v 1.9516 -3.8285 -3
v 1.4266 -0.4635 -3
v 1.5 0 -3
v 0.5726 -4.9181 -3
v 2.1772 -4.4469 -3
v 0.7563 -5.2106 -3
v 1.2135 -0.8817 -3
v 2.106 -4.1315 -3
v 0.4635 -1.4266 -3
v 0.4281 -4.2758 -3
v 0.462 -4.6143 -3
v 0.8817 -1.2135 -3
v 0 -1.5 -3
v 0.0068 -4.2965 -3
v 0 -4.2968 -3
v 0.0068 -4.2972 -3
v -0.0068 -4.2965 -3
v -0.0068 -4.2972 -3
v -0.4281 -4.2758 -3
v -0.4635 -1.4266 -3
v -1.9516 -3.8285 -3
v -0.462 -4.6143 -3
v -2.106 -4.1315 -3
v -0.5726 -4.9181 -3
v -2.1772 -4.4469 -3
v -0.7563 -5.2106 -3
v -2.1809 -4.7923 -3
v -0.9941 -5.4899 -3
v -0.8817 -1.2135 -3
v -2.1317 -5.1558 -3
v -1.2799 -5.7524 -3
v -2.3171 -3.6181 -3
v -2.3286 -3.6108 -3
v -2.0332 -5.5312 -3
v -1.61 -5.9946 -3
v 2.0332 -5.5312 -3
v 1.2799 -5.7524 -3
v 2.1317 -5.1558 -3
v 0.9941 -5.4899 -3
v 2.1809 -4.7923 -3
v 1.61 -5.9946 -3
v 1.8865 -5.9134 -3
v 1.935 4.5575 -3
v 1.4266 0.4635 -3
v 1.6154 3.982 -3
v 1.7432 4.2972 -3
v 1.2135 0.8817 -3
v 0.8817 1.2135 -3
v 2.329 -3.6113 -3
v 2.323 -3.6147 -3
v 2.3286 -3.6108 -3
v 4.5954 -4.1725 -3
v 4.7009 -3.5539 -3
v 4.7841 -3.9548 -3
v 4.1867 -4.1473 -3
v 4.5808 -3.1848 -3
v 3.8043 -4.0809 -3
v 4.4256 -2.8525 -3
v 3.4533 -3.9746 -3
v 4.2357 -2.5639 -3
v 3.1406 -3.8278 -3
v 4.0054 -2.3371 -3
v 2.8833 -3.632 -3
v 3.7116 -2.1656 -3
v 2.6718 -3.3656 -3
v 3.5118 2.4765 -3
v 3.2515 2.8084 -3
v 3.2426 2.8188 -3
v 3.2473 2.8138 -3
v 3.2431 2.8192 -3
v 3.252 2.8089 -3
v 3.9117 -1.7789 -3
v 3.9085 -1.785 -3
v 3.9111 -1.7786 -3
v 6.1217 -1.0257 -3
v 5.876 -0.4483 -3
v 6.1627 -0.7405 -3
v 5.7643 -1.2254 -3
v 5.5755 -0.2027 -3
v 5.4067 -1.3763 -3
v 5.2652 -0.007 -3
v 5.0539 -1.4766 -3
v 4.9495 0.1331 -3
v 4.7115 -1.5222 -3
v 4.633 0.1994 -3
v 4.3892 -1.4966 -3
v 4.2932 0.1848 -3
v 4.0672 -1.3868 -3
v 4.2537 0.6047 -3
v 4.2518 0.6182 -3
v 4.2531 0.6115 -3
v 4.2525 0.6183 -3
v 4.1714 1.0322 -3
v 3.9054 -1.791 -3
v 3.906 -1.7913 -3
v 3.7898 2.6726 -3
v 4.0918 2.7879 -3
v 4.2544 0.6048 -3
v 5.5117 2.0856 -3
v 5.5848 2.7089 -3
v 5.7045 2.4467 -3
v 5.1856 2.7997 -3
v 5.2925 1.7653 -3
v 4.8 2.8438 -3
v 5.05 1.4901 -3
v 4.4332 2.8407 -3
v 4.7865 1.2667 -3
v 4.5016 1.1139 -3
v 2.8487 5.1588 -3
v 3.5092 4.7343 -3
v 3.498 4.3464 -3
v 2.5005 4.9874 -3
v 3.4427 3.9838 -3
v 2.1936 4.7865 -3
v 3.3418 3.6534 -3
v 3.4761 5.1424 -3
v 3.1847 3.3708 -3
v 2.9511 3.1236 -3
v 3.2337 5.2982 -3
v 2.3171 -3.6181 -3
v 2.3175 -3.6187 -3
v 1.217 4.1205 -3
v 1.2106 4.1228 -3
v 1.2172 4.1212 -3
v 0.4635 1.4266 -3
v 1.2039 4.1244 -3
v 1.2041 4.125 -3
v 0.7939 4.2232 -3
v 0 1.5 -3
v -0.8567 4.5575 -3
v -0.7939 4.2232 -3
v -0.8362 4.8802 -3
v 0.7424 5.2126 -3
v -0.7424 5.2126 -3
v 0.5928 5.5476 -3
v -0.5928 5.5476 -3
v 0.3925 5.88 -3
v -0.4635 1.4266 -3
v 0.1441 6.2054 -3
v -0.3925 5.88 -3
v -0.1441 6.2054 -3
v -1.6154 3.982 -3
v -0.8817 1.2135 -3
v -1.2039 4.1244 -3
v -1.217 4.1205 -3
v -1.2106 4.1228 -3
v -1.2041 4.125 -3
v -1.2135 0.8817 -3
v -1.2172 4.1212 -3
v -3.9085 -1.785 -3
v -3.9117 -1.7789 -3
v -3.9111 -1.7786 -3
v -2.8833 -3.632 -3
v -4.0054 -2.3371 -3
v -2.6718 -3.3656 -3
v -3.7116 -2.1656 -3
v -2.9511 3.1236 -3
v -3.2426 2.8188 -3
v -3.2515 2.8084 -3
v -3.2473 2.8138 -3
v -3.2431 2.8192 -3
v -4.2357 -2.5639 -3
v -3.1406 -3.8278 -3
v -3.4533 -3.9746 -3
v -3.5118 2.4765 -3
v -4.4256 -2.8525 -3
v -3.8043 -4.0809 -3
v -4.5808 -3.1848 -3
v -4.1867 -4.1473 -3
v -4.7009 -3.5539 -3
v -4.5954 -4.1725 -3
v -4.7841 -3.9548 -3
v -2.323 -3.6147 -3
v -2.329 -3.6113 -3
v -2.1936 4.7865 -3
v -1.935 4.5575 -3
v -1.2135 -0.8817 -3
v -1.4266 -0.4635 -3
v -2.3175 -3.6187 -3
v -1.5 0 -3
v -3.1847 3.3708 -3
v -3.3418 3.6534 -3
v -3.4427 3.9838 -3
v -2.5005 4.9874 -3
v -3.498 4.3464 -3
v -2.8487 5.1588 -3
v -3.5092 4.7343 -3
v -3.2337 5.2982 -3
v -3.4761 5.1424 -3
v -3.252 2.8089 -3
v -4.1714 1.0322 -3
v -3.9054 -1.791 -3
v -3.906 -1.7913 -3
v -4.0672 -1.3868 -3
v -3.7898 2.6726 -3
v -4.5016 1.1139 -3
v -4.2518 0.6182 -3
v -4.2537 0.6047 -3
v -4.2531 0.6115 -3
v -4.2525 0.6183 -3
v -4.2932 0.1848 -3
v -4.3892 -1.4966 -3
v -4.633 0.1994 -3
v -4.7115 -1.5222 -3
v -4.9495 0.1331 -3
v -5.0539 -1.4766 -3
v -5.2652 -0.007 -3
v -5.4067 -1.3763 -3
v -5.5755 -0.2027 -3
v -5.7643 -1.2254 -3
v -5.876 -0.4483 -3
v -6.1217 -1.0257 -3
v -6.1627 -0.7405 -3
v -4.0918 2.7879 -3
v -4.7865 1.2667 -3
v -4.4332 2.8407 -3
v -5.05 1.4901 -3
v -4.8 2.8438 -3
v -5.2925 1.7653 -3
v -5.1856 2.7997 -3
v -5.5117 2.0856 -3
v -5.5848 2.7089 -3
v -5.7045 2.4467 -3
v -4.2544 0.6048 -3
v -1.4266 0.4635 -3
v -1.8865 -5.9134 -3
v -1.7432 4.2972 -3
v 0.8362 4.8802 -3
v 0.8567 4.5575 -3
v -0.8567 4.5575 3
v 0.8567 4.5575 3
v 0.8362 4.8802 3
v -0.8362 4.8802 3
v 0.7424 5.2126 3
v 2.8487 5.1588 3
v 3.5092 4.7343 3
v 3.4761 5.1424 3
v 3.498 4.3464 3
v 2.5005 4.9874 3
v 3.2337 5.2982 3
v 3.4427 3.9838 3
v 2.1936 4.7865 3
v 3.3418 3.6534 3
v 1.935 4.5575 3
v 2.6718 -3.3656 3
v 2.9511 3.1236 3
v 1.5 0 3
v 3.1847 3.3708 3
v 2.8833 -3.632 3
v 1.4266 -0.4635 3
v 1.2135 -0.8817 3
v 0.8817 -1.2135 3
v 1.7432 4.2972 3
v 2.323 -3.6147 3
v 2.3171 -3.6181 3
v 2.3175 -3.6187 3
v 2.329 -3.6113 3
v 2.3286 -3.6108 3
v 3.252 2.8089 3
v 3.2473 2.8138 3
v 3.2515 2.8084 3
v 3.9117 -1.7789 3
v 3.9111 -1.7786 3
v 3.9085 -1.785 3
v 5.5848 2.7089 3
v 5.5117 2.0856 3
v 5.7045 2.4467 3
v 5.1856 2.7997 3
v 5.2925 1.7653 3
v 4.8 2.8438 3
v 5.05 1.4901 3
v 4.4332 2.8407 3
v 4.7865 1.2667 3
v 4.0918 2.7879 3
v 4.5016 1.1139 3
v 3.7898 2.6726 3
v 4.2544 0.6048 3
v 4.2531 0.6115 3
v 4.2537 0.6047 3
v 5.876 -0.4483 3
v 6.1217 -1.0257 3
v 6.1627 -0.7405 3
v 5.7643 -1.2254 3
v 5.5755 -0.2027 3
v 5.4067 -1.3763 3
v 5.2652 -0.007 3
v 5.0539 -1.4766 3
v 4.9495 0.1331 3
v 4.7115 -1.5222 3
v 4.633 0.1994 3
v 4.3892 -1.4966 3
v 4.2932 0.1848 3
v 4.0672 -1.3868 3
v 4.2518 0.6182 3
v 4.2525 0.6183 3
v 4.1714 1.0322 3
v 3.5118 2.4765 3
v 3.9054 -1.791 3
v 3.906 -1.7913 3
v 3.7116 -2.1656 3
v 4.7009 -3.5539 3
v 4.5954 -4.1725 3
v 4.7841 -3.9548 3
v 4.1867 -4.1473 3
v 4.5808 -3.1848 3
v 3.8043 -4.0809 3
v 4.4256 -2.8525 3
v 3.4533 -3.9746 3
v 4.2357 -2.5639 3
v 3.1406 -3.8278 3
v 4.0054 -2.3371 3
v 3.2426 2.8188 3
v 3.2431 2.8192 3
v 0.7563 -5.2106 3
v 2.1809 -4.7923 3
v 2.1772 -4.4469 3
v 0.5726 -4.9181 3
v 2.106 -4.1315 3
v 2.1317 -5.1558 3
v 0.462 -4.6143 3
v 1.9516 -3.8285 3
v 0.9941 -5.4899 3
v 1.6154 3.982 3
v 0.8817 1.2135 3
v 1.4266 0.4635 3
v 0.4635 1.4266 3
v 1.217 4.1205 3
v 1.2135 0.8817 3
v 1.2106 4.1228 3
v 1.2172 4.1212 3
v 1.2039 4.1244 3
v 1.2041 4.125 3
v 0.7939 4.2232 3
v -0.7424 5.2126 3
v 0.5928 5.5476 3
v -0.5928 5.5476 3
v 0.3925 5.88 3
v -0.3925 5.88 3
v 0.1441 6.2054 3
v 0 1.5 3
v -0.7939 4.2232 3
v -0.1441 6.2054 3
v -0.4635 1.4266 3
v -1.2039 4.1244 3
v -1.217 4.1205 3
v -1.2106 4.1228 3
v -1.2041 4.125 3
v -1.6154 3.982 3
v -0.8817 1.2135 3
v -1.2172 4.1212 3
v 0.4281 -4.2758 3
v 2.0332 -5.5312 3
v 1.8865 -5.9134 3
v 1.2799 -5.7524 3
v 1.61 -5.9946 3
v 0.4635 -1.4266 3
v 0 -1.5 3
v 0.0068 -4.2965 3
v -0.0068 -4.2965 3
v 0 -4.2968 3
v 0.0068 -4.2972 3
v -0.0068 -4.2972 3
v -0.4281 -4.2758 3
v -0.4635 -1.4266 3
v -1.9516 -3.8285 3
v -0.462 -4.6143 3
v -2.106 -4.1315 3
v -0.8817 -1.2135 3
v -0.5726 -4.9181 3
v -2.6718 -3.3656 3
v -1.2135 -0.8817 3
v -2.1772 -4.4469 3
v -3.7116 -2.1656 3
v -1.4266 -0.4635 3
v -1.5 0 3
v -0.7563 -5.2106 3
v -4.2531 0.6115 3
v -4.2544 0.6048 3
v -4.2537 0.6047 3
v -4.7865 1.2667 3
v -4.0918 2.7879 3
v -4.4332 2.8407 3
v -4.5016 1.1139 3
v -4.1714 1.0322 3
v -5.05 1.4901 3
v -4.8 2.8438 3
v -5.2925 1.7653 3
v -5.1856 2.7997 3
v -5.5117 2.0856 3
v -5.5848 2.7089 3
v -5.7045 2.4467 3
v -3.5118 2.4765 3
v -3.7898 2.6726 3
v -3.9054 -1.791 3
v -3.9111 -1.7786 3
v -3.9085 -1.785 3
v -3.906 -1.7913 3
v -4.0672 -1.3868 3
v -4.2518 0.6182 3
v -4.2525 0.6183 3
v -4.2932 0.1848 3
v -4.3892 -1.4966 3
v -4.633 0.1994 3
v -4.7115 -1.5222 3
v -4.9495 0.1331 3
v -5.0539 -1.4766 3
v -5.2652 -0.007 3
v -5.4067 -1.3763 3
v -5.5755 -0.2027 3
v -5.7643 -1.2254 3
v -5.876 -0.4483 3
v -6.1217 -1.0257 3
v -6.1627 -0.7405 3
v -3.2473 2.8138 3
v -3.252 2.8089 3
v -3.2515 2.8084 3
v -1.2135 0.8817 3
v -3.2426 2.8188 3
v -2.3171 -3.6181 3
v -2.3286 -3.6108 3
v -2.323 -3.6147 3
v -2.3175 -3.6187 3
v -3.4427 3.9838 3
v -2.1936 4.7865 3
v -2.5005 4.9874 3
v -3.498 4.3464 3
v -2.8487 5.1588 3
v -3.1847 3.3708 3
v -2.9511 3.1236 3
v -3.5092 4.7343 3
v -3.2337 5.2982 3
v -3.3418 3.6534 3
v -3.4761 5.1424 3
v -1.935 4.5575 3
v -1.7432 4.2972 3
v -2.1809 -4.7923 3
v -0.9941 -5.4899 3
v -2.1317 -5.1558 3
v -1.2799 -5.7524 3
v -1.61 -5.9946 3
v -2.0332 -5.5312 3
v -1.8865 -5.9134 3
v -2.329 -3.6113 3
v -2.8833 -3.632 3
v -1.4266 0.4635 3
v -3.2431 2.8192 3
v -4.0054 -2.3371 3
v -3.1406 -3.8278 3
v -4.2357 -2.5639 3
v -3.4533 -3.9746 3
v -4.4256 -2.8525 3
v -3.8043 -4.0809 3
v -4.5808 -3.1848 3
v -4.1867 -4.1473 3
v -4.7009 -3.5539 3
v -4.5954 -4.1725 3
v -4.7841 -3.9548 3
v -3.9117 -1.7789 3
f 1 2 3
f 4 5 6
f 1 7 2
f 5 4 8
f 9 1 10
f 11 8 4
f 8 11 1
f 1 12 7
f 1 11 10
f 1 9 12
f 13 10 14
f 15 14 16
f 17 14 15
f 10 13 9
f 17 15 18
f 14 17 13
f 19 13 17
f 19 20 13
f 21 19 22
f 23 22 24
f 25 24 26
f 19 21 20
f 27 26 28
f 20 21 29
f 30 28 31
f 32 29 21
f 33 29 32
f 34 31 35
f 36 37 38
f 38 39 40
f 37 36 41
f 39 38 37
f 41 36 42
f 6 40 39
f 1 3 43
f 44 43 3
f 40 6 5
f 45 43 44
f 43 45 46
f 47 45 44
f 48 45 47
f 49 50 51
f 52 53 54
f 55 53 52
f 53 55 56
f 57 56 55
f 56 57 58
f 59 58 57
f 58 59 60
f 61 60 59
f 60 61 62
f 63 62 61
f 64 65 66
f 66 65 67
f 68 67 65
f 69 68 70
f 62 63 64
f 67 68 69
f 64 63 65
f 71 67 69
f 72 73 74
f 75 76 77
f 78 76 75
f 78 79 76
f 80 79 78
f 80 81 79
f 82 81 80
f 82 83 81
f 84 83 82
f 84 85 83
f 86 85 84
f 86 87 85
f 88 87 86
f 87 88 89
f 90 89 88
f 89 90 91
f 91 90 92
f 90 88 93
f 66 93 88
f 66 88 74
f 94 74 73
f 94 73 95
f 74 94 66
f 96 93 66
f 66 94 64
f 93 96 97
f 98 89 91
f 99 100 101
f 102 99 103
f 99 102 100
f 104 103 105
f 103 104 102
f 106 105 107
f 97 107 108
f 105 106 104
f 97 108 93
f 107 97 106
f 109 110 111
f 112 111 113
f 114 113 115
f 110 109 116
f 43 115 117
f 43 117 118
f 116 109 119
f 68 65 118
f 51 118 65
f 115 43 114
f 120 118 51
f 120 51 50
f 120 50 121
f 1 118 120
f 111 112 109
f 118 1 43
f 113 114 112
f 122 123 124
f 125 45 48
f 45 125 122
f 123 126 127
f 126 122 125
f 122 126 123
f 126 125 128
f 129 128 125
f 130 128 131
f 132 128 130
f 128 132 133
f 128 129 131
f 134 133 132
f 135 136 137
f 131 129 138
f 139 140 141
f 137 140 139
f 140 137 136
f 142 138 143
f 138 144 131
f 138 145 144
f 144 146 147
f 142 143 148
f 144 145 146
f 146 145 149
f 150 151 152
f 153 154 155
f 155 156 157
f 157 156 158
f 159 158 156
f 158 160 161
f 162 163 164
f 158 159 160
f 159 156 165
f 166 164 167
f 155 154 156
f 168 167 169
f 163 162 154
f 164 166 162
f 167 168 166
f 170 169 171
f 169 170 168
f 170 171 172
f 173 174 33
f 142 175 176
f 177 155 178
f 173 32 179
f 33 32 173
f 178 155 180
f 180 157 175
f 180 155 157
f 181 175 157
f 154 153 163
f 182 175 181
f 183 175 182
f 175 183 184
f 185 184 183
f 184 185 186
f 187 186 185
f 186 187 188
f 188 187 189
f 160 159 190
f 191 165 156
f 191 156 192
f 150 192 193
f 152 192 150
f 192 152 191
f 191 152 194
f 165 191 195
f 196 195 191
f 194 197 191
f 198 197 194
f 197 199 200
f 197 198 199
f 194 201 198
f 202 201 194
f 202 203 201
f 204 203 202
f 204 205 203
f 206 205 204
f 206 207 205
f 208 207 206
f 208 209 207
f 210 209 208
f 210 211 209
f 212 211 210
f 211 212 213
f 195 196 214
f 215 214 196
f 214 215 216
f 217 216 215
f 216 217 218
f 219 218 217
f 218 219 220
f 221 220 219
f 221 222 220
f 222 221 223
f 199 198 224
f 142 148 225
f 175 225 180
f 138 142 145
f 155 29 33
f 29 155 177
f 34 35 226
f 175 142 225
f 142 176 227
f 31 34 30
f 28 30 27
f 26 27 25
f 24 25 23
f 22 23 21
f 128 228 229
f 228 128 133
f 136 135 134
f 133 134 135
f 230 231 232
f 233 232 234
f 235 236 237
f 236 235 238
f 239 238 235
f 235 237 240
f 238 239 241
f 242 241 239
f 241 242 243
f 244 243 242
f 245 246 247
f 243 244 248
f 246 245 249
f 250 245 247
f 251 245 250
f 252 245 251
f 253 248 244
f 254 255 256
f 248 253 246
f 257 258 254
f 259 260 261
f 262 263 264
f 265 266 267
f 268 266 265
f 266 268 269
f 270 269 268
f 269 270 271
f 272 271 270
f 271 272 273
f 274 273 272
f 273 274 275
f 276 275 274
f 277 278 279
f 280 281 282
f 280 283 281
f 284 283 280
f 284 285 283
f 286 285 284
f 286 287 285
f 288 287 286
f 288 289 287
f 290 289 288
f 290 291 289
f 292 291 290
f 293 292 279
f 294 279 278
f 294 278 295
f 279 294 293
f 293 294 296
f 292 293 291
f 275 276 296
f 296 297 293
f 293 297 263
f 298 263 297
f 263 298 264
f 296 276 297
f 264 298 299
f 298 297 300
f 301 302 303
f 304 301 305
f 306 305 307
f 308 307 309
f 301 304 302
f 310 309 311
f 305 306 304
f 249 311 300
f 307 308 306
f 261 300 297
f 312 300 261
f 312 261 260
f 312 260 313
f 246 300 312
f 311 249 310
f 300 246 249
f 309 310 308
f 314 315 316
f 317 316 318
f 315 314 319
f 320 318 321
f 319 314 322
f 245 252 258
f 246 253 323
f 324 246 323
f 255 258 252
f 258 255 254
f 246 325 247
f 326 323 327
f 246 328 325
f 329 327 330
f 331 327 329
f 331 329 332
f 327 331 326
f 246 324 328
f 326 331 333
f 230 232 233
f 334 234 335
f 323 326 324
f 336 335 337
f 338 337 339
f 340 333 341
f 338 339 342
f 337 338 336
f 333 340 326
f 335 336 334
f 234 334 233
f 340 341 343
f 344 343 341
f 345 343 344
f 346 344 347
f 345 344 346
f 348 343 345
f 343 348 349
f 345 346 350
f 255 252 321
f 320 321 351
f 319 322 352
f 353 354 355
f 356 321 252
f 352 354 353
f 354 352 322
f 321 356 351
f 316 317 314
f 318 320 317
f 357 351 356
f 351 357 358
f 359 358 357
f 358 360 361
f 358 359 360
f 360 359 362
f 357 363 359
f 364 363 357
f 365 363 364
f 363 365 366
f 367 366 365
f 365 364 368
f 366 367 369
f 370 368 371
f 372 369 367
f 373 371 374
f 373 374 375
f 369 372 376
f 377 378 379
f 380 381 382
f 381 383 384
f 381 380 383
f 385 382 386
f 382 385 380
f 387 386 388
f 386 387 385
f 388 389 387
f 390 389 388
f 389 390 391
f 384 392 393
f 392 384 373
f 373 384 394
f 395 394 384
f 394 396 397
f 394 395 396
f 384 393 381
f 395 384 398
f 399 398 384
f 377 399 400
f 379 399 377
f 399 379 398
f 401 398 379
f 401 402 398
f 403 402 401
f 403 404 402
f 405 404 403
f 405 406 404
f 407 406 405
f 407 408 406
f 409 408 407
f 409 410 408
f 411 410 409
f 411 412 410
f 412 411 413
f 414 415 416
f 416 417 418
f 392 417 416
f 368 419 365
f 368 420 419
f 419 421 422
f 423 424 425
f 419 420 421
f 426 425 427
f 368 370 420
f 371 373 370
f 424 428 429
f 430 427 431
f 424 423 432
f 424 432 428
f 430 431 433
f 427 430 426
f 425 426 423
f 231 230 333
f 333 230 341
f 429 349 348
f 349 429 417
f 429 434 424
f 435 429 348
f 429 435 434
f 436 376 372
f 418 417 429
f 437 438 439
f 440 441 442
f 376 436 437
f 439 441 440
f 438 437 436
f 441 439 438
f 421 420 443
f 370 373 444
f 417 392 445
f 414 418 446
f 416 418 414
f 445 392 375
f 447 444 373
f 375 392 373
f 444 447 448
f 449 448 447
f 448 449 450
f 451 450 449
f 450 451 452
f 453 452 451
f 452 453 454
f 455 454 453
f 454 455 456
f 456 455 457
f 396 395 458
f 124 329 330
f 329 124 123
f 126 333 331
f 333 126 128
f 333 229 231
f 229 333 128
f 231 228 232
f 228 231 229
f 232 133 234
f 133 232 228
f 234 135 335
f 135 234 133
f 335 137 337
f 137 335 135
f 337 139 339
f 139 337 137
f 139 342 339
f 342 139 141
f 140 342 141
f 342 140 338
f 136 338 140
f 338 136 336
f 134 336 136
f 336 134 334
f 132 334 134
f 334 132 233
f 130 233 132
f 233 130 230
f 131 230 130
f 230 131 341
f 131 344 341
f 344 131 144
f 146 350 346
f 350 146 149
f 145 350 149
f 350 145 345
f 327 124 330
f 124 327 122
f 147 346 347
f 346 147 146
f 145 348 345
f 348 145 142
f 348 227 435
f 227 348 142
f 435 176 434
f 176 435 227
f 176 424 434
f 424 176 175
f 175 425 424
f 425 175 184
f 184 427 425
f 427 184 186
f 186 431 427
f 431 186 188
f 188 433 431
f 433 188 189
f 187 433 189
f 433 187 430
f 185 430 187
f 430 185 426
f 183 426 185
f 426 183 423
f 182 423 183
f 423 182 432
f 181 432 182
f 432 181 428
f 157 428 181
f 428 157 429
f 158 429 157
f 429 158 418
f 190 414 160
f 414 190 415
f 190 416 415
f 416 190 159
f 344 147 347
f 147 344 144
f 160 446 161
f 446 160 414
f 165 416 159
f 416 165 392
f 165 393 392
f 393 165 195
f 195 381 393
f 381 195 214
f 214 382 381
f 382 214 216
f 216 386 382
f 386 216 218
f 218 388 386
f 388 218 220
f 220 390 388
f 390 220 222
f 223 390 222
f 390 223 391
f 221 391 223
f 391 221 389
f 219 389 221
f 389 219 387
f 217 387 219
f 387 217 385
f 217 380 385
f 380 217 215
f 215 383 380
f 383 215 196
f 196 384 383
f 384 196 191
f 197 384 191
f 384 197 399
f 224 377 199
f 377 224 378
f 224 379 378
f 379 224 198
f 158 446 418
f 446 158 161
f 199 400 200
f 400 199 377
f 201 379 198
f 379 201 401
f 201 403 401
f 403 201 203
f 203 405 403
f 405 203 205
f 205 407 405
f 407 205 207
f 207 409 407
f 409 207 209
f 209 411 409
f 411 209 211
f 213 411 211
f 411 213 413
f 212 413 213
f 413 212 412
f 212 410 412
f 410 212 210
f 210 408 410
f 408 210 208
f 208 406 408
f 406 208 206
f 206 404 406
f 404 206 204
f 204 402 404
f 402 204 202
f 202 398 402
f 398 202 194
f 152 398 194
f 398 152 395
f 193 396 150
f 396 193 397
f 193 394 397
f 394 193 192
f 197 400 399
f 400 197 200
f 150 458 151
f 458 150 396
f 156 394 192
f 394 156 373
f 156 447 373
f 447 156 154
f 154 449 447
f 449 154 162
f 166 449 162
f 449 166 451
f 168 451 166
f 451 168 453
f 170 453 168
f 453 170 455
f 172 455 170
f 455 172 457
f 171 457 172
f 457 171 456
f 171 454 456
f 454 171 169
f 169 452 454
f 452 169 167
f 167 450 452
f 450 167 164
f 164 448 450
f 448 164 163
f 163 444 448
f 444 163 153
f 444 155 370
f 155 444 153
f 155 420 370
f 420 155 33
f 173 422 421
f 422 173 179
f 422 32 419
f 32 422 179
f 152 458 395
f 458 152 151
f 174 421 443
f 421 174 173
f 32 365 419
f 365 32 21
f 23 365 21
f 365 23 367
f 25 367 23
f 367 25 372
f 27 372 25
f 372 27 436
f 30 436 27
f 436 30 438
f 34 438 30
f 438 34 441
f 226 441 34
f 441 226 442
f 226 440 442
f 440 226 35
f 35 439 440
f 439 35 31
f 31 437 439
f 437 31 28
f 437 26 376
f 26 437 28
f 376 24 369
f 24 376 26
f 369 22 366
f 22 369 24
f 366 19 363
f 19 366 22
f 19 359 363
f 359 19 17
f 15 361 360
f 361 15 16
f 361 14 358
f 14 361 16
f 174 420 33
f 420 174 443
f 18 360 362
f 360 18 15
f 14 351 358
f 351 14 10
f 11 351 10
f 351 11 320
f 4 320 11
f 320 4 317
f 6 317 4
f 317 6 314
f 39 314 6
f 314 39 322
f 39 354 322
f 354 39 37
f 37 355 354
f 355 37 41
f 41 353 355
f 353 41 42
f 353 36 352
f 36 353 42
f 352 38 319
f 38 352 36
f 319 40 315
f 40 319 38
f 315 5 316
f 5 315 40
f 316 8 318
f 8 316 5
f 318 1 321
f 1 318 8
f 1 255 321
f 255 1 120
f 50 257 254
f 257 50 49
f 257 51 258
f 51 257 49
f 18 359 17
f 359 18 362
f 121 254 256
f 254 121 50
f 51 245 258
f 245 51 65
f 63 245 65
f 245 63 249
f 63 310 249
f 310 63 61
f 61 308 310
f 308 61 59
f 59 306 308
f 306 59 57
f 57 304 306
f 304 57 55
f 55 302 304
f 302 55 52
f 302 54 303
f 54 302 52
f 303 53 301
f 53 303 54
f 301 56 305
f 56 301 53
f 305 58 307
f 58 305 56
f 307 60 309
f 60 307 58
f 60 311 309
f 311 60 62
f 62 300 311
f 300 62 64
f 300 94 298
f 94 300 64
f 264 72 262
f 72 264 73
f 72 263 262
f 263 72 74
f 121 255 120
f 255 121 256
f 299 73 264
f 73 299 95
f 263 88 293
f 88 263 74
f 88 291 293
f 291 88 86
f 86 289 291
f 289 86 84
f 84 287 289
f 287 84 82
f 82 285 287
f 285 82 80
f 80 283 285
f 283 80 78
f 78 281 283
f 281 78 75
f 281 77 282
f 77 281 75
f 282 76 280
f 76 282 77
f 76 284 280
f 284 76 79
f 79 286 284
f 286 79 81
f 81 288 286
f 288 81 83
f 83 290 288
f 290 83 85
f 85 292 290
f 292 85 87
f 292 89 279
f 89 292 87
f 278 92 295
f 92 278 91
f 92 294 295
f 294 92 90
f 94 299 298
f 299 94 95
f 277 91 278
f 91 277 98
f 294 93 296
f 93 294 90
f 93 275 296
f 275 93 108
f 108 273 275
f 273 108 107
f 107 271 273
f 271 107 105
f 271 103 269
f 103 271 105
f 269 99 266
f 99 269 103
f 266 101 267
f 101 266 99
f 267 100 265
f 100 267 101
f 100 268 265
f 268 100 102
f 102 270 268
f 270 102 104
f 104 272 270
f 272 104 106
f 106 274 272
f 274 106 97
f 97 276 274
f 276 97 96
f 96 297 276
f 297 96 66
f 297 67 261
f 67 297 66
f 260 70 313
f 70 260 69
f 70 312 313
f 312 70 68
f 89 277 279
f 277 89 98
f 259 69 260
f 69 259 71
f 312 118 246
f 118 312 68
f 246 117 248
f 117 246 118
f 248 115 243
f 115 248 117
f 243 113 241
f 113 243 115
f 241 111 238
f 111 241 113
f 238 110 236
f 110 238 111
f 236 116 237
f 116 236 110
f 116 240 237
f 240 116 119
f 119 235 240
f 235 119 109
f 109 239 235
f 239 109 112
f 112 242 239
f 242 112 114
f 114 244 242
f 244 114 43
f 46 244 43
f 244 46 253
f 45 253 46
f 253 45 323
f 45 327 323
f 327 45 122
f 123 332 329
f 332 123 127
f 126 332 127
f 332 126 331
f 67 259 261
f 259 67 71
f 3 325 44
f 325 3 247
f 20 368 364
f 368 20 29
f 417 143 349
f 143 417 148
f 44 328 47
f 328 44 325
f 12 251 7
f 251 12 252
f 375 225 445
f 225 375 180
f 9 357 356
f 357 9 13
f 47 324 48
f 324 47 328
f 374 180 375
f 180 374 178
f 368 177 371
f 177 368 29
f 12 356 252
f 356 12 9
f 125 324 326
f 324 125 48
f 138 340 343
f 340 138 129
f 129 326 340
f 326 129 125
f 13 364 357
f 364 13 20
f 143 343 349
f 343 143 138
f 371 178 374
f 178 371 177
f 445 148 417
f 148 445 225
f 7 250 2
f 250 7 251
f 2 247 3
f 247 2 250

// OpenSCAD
//////////////////////////////////////////////////////////////////////////////////////////////
// Public Domain Parametric Involute Spur Gear (and involute helical gear and involute rack)
// version 1.1
// by Leemon Baird, 2011, Leemon@Leemon.com
//http://www.thingiverse.com/thing:5505
//
// This file is public domain.  Use it for any purpose, including commercial
// applications.  Attribution would be nice, but is not required.  There is
// no warranty of any kind, including its correctness, usefulness, or safety.
// 
// This is parameterized involute spur (or helical) gear.  It is much simpler and less powerful than
// others on Thingiverse.  But it is public domain.  I implemented it from scratch from the 
// descriptions and equations on Wikipedia and the web, using Mathematica for calculations and testing,
// and I now release it into the public domain.
//
//		http://en.wikipedia.org/wiki/Involute_gear
//		http://en.wikipedia.org/wiki/Gear
//		http://en.wikipedia.org/wiki/List_of_gear_nomenclature
//		http://gtrebaol.free.fr/doc/catia/spur_gear.html
//		http://www.cs.cmu.edu/~rapidproto/mechanisms/chpt7.html
//
// The module gear() gives an involute spur gear, with reasonable defaults for all the parameters.
// Normally, you should just choose the first 4 parameters, and let the rest be default values.
// The module gear() gives a gear in the XY plane, centered on the origin, with one tooth centered on
// the positive Y axis.  The various functions below it take the same parameters, and return various
// measurements for the gear.  The most important is pitch_radius, which tells how far apart to space
// gears that are meshing, and adendum_radius, which gives the size of the region filled by the gear.
// A gear has a "pitch circle", which is an invisible circle that cuts through the middle of each
// tooth (though not the exact center). In order for two gears to mesh, their pitch circles should 
// just touch.  So the distance between their centers should be pitch_radius() for one, plus pitch_radius() 
// for the other, which gives the radii of their pitch circles.
//
// In order for two gears to mesh, they must have the same mm_per_tooth and pressure_angle parameters.  
// mm_per_tooth gives the number of millimeters of arc around the pitch circle covered by one tooth and one
// space between teeth.  The pitch angle controls how flat or bulged the sides of the teeth are.  Common
// values include 14.5 degrees and 20 degrees, and occasionally 25.  Though I've seen 28 recommended for
// plastic gears. Larger numbers bulge out more, giving stronger teeth, so 28 degrees is the default here.
//
// The ratio of number_of_teeth for two meshing gears gives how many times one will make a full 
// revolution when the the other makes one full revolution.  If the two numbers are coprime (i.e. 
// are not both divisible by the same number greater than 1), then every tooth on one gear
// will meet every tooth on the other, for more even wear.  So coprime numbers of teeth are good.
//
// The module rack() gives a rack, which is a bar with teeth.  A rack can mesh with any
// gear that has the same mm_per_tooth and pressure_angle.
//
// Some terminology: 
// The outline of a gear is a smooth circle (the "pitch circle") which has mountains and valleys
// added so it is toothed.  So there is an inner circle (the "root circle") that touches the 
// base of all the teeth, an outer circle that touches the tips of all the teeth,
// and the invisible pitch circle in between them.  There is also a "base circle", which can be smaller than
// all three of the others, which controls the shape of the teeth.  The side of each tooth lies on the path 
// that the end of a string would follow if it were wrapped tightly around the base circle, then slowly unwound.  
// That shape is an "involute", which gives this type of gear its name.
//
//////////////////////////////////////////////////////////////////////////////////////////////

//An involute spur gear, with reasonable defaults for all the parameters.
//Normally, you should just choose the first 4 parameters, and let the rest be default values.
//Meshing gears must match in mm_per_tooth, pressure_angle, and twist,
//and be separated by the sum of their pitch radii, which can be found with pitch_radius().
module gear (
	mm_per_tooth    = 3,    //this is the "circular pitch", the circumference of the pitch circle divided by the number of teeth
	number_of_teeth = 11,   //total number of teeth around the entire perimeter
	thickness       = 6,    //thickness of gear in mm
	hole_diameter   = 3,    //diameter of the hole in the center, in mm
	twist           = 0,    //teeth rotate this many degrees from bottom of gear to top.  360 makes the gear a screw with each thread going around once
	teeth_to_hide   = 0,    //number of teeth to delete to make this only a fraction of a circle
	pressure_angle  = 28,   //Controls how straight or bulged the tooth sides are. In degrees.
	clearance       = 0.0,  //gap between top of a tooth on one gear and bottom of valley on a meshing gear (in millimeters)
	backlash        = 0.0   //gap between two meshing teeth, in the direction along the circumference of the pitch circle
) {
	assign(pi = 3.1415926)
	assign(p  = mm_per_tooth * number_of_teeth / pi / 2)  //radius of pitch circle
	assign(c  = p + mm_per_tooth / pi - clearance)        //radius of outer circle
	assign(b  = p*cos(pressure_angle))                    //radius of base circle
	assign(r  = p-(c-p)-clearance)                        //radius of root circle
	assign(t  = mm_per_tooth/2-backlash/2)                //tooth thickness at pitch circle
	assign(k  = -iang(b, p) - t/2/p/pi*180) {             //angle to where involute meets base circle on each side of tooth
		difference() {
			for (i = [0:number_of_teeth-teeth_to_hide-1] )
				rotate([0,0,i*360/number_of_teeth])
					linear_extrude(height = thickness, center = true, convexity = 10, twist = twist)
						polygon(
							points=[
								[0, -hole_diameter/10],
								polar(r, -181/number_of_teeth),
								polar(r, r<b ? k : -180/number_of_teeth),
								q7(0/5,r,b,c,k, 1),q7(1/5,r,b,c,k, 1),q7(2/5,r,b,c,k, 1),q7(3/5,r,b,c,k, 1),q7(4/5,r,b,c,k, 1),q7(5/5,r,b,c,k, 1),
								q7(5/5,r,b,c,k,-1),q7(4/5,r,b,c,k,-1),q7(3/5,r,b,c,k,-1),q7(2/5,r,b,c,k,-1),q7(1/5,r,b,c,k,-1),q7(0/5,r,b,c,k,-1),
								polar(r, r<b ? -k : 180/number_of_teeth),
								polar(r, 181/number_of_teeth)
							],
 							paths=[[0,1,2,3,4,5,6,7,8,9,10,11,12,13,14,15,16]]
						);
			cylinder(h=2*thickness+1, r=hole_diameter/2, center=true, $fn=20);
		}
	}
};	
//these 4 functions are used by gear
function polar(r,theta)   = r*[sin(theta), cos(theta)];                            //convert polar to cartesian coordinates
function iang(r1,r2)      = sqrt((r2/r1)*(r2/r1) - 1)/3.1415926*180 - acos(r1/r2); //unwind a string this many degrees to go from radius r1 to radius r2
function q7(f,r,b,r2,t,s) = q6(b,s,t,(1-f)*max(b,r)+f*r2);                         //radius a fraction f up the curved side of the tooth 
function q6(b,s,t,d)      = polar(d,s*(iang(b,d)+t));                              //point at radius d on the involute curve

//a rack, which is a straight line with teeth (the same as a segment from a giant gear with a huge number of teeth).
//The "pitch circle" is a line along the X axis.
module rack (
	mm_per_tooth    = 3,    //this is the "circular pitch", the circumference of the pitch circle divided by the number of teeth
	number_of_teeth = 11,   //total number of teeth along the rack
	thickness       = 6,    //thickness of rack in mm (affects each tooth)
	height          = 120,   //height of rack in mm, from tooth top to far side of rack.
	pressure_angle  = 28,   //Controls how straight or bulged the tooth sides are. In degrees.
	backlash        = 0.0   //gap between two meshing teeth, in the direction along the circumference of the pitch circle
) {
	assign(pi = 3.1415926)
	assign(a = mm_per_tooth / pi) //addendum
	assign(t = a*cos(pressure_angle)-1)         //tooth side is tilted so top/bottom corners move this amount
		for (i = [0:number_of_teeth-1] )
			translate([i*mm_per_tooth,0,0])
				linear_extrude(height = thickness, center = true, convexity = 10)
					polygon(
						points=[
							[-mm_per_tooth * 3/4,                 a-height],
							[-mm_per_tooth * 3/4 - backlash,     -a],
							[-mm_per_tooth * 1/4 + backlash - t, -a],
							[-mm_per_tooth * 1/4 + backlash + t,  a],
							[ mm_per_tooth * 1/4 - backlash - t,  a],
							[ mm_per_tooth * 1/4 - backlash + t, -a],
							[ mm_per_tooth * 3/4 + backlash,     -a],
							[ mm_per_tooth * 3/4,                 a-height],
						],
						paths=[[0,1,2,3,4,5,6,7]]
					);
};	

//These 5 functions let the user find the derived dimensions of the gear.
//A gear fits within a circle of radius outer_radius, and two gears should have
//their centers separated by the sum of their pictch_radius.
function circular_pitch  (mm_per_tooth=3) = mm_per_tooth;                     //tooth density expressed as "circular pitch" in millimeters
function diametral_pitch (mm_per_tooth=3) = 3.1415926 / mm_per_tooth;         //tooth density expressed as "diametral pitch" in teeth per millimeter
function module_value    (mm_per_tooth=3) = mm_per_tooth / pi;                //tooth density expressed as "module" or "modulus" in millimeters
function pitch_radius    (mm_per_tooth=3,number_of_teeth=11) = mm_per_tooth * number_of_teeth / 3.1415926 / 2;
function outer_radius    (mm_per_tooth=3,number_of_teeth=11,clearance=0.1)    //The gear fits entirely within a cylinder of this radius.
	= mm_per_tooth*(1+number_of_teeth/2)/3.1415926  - clearance;             

gear();
